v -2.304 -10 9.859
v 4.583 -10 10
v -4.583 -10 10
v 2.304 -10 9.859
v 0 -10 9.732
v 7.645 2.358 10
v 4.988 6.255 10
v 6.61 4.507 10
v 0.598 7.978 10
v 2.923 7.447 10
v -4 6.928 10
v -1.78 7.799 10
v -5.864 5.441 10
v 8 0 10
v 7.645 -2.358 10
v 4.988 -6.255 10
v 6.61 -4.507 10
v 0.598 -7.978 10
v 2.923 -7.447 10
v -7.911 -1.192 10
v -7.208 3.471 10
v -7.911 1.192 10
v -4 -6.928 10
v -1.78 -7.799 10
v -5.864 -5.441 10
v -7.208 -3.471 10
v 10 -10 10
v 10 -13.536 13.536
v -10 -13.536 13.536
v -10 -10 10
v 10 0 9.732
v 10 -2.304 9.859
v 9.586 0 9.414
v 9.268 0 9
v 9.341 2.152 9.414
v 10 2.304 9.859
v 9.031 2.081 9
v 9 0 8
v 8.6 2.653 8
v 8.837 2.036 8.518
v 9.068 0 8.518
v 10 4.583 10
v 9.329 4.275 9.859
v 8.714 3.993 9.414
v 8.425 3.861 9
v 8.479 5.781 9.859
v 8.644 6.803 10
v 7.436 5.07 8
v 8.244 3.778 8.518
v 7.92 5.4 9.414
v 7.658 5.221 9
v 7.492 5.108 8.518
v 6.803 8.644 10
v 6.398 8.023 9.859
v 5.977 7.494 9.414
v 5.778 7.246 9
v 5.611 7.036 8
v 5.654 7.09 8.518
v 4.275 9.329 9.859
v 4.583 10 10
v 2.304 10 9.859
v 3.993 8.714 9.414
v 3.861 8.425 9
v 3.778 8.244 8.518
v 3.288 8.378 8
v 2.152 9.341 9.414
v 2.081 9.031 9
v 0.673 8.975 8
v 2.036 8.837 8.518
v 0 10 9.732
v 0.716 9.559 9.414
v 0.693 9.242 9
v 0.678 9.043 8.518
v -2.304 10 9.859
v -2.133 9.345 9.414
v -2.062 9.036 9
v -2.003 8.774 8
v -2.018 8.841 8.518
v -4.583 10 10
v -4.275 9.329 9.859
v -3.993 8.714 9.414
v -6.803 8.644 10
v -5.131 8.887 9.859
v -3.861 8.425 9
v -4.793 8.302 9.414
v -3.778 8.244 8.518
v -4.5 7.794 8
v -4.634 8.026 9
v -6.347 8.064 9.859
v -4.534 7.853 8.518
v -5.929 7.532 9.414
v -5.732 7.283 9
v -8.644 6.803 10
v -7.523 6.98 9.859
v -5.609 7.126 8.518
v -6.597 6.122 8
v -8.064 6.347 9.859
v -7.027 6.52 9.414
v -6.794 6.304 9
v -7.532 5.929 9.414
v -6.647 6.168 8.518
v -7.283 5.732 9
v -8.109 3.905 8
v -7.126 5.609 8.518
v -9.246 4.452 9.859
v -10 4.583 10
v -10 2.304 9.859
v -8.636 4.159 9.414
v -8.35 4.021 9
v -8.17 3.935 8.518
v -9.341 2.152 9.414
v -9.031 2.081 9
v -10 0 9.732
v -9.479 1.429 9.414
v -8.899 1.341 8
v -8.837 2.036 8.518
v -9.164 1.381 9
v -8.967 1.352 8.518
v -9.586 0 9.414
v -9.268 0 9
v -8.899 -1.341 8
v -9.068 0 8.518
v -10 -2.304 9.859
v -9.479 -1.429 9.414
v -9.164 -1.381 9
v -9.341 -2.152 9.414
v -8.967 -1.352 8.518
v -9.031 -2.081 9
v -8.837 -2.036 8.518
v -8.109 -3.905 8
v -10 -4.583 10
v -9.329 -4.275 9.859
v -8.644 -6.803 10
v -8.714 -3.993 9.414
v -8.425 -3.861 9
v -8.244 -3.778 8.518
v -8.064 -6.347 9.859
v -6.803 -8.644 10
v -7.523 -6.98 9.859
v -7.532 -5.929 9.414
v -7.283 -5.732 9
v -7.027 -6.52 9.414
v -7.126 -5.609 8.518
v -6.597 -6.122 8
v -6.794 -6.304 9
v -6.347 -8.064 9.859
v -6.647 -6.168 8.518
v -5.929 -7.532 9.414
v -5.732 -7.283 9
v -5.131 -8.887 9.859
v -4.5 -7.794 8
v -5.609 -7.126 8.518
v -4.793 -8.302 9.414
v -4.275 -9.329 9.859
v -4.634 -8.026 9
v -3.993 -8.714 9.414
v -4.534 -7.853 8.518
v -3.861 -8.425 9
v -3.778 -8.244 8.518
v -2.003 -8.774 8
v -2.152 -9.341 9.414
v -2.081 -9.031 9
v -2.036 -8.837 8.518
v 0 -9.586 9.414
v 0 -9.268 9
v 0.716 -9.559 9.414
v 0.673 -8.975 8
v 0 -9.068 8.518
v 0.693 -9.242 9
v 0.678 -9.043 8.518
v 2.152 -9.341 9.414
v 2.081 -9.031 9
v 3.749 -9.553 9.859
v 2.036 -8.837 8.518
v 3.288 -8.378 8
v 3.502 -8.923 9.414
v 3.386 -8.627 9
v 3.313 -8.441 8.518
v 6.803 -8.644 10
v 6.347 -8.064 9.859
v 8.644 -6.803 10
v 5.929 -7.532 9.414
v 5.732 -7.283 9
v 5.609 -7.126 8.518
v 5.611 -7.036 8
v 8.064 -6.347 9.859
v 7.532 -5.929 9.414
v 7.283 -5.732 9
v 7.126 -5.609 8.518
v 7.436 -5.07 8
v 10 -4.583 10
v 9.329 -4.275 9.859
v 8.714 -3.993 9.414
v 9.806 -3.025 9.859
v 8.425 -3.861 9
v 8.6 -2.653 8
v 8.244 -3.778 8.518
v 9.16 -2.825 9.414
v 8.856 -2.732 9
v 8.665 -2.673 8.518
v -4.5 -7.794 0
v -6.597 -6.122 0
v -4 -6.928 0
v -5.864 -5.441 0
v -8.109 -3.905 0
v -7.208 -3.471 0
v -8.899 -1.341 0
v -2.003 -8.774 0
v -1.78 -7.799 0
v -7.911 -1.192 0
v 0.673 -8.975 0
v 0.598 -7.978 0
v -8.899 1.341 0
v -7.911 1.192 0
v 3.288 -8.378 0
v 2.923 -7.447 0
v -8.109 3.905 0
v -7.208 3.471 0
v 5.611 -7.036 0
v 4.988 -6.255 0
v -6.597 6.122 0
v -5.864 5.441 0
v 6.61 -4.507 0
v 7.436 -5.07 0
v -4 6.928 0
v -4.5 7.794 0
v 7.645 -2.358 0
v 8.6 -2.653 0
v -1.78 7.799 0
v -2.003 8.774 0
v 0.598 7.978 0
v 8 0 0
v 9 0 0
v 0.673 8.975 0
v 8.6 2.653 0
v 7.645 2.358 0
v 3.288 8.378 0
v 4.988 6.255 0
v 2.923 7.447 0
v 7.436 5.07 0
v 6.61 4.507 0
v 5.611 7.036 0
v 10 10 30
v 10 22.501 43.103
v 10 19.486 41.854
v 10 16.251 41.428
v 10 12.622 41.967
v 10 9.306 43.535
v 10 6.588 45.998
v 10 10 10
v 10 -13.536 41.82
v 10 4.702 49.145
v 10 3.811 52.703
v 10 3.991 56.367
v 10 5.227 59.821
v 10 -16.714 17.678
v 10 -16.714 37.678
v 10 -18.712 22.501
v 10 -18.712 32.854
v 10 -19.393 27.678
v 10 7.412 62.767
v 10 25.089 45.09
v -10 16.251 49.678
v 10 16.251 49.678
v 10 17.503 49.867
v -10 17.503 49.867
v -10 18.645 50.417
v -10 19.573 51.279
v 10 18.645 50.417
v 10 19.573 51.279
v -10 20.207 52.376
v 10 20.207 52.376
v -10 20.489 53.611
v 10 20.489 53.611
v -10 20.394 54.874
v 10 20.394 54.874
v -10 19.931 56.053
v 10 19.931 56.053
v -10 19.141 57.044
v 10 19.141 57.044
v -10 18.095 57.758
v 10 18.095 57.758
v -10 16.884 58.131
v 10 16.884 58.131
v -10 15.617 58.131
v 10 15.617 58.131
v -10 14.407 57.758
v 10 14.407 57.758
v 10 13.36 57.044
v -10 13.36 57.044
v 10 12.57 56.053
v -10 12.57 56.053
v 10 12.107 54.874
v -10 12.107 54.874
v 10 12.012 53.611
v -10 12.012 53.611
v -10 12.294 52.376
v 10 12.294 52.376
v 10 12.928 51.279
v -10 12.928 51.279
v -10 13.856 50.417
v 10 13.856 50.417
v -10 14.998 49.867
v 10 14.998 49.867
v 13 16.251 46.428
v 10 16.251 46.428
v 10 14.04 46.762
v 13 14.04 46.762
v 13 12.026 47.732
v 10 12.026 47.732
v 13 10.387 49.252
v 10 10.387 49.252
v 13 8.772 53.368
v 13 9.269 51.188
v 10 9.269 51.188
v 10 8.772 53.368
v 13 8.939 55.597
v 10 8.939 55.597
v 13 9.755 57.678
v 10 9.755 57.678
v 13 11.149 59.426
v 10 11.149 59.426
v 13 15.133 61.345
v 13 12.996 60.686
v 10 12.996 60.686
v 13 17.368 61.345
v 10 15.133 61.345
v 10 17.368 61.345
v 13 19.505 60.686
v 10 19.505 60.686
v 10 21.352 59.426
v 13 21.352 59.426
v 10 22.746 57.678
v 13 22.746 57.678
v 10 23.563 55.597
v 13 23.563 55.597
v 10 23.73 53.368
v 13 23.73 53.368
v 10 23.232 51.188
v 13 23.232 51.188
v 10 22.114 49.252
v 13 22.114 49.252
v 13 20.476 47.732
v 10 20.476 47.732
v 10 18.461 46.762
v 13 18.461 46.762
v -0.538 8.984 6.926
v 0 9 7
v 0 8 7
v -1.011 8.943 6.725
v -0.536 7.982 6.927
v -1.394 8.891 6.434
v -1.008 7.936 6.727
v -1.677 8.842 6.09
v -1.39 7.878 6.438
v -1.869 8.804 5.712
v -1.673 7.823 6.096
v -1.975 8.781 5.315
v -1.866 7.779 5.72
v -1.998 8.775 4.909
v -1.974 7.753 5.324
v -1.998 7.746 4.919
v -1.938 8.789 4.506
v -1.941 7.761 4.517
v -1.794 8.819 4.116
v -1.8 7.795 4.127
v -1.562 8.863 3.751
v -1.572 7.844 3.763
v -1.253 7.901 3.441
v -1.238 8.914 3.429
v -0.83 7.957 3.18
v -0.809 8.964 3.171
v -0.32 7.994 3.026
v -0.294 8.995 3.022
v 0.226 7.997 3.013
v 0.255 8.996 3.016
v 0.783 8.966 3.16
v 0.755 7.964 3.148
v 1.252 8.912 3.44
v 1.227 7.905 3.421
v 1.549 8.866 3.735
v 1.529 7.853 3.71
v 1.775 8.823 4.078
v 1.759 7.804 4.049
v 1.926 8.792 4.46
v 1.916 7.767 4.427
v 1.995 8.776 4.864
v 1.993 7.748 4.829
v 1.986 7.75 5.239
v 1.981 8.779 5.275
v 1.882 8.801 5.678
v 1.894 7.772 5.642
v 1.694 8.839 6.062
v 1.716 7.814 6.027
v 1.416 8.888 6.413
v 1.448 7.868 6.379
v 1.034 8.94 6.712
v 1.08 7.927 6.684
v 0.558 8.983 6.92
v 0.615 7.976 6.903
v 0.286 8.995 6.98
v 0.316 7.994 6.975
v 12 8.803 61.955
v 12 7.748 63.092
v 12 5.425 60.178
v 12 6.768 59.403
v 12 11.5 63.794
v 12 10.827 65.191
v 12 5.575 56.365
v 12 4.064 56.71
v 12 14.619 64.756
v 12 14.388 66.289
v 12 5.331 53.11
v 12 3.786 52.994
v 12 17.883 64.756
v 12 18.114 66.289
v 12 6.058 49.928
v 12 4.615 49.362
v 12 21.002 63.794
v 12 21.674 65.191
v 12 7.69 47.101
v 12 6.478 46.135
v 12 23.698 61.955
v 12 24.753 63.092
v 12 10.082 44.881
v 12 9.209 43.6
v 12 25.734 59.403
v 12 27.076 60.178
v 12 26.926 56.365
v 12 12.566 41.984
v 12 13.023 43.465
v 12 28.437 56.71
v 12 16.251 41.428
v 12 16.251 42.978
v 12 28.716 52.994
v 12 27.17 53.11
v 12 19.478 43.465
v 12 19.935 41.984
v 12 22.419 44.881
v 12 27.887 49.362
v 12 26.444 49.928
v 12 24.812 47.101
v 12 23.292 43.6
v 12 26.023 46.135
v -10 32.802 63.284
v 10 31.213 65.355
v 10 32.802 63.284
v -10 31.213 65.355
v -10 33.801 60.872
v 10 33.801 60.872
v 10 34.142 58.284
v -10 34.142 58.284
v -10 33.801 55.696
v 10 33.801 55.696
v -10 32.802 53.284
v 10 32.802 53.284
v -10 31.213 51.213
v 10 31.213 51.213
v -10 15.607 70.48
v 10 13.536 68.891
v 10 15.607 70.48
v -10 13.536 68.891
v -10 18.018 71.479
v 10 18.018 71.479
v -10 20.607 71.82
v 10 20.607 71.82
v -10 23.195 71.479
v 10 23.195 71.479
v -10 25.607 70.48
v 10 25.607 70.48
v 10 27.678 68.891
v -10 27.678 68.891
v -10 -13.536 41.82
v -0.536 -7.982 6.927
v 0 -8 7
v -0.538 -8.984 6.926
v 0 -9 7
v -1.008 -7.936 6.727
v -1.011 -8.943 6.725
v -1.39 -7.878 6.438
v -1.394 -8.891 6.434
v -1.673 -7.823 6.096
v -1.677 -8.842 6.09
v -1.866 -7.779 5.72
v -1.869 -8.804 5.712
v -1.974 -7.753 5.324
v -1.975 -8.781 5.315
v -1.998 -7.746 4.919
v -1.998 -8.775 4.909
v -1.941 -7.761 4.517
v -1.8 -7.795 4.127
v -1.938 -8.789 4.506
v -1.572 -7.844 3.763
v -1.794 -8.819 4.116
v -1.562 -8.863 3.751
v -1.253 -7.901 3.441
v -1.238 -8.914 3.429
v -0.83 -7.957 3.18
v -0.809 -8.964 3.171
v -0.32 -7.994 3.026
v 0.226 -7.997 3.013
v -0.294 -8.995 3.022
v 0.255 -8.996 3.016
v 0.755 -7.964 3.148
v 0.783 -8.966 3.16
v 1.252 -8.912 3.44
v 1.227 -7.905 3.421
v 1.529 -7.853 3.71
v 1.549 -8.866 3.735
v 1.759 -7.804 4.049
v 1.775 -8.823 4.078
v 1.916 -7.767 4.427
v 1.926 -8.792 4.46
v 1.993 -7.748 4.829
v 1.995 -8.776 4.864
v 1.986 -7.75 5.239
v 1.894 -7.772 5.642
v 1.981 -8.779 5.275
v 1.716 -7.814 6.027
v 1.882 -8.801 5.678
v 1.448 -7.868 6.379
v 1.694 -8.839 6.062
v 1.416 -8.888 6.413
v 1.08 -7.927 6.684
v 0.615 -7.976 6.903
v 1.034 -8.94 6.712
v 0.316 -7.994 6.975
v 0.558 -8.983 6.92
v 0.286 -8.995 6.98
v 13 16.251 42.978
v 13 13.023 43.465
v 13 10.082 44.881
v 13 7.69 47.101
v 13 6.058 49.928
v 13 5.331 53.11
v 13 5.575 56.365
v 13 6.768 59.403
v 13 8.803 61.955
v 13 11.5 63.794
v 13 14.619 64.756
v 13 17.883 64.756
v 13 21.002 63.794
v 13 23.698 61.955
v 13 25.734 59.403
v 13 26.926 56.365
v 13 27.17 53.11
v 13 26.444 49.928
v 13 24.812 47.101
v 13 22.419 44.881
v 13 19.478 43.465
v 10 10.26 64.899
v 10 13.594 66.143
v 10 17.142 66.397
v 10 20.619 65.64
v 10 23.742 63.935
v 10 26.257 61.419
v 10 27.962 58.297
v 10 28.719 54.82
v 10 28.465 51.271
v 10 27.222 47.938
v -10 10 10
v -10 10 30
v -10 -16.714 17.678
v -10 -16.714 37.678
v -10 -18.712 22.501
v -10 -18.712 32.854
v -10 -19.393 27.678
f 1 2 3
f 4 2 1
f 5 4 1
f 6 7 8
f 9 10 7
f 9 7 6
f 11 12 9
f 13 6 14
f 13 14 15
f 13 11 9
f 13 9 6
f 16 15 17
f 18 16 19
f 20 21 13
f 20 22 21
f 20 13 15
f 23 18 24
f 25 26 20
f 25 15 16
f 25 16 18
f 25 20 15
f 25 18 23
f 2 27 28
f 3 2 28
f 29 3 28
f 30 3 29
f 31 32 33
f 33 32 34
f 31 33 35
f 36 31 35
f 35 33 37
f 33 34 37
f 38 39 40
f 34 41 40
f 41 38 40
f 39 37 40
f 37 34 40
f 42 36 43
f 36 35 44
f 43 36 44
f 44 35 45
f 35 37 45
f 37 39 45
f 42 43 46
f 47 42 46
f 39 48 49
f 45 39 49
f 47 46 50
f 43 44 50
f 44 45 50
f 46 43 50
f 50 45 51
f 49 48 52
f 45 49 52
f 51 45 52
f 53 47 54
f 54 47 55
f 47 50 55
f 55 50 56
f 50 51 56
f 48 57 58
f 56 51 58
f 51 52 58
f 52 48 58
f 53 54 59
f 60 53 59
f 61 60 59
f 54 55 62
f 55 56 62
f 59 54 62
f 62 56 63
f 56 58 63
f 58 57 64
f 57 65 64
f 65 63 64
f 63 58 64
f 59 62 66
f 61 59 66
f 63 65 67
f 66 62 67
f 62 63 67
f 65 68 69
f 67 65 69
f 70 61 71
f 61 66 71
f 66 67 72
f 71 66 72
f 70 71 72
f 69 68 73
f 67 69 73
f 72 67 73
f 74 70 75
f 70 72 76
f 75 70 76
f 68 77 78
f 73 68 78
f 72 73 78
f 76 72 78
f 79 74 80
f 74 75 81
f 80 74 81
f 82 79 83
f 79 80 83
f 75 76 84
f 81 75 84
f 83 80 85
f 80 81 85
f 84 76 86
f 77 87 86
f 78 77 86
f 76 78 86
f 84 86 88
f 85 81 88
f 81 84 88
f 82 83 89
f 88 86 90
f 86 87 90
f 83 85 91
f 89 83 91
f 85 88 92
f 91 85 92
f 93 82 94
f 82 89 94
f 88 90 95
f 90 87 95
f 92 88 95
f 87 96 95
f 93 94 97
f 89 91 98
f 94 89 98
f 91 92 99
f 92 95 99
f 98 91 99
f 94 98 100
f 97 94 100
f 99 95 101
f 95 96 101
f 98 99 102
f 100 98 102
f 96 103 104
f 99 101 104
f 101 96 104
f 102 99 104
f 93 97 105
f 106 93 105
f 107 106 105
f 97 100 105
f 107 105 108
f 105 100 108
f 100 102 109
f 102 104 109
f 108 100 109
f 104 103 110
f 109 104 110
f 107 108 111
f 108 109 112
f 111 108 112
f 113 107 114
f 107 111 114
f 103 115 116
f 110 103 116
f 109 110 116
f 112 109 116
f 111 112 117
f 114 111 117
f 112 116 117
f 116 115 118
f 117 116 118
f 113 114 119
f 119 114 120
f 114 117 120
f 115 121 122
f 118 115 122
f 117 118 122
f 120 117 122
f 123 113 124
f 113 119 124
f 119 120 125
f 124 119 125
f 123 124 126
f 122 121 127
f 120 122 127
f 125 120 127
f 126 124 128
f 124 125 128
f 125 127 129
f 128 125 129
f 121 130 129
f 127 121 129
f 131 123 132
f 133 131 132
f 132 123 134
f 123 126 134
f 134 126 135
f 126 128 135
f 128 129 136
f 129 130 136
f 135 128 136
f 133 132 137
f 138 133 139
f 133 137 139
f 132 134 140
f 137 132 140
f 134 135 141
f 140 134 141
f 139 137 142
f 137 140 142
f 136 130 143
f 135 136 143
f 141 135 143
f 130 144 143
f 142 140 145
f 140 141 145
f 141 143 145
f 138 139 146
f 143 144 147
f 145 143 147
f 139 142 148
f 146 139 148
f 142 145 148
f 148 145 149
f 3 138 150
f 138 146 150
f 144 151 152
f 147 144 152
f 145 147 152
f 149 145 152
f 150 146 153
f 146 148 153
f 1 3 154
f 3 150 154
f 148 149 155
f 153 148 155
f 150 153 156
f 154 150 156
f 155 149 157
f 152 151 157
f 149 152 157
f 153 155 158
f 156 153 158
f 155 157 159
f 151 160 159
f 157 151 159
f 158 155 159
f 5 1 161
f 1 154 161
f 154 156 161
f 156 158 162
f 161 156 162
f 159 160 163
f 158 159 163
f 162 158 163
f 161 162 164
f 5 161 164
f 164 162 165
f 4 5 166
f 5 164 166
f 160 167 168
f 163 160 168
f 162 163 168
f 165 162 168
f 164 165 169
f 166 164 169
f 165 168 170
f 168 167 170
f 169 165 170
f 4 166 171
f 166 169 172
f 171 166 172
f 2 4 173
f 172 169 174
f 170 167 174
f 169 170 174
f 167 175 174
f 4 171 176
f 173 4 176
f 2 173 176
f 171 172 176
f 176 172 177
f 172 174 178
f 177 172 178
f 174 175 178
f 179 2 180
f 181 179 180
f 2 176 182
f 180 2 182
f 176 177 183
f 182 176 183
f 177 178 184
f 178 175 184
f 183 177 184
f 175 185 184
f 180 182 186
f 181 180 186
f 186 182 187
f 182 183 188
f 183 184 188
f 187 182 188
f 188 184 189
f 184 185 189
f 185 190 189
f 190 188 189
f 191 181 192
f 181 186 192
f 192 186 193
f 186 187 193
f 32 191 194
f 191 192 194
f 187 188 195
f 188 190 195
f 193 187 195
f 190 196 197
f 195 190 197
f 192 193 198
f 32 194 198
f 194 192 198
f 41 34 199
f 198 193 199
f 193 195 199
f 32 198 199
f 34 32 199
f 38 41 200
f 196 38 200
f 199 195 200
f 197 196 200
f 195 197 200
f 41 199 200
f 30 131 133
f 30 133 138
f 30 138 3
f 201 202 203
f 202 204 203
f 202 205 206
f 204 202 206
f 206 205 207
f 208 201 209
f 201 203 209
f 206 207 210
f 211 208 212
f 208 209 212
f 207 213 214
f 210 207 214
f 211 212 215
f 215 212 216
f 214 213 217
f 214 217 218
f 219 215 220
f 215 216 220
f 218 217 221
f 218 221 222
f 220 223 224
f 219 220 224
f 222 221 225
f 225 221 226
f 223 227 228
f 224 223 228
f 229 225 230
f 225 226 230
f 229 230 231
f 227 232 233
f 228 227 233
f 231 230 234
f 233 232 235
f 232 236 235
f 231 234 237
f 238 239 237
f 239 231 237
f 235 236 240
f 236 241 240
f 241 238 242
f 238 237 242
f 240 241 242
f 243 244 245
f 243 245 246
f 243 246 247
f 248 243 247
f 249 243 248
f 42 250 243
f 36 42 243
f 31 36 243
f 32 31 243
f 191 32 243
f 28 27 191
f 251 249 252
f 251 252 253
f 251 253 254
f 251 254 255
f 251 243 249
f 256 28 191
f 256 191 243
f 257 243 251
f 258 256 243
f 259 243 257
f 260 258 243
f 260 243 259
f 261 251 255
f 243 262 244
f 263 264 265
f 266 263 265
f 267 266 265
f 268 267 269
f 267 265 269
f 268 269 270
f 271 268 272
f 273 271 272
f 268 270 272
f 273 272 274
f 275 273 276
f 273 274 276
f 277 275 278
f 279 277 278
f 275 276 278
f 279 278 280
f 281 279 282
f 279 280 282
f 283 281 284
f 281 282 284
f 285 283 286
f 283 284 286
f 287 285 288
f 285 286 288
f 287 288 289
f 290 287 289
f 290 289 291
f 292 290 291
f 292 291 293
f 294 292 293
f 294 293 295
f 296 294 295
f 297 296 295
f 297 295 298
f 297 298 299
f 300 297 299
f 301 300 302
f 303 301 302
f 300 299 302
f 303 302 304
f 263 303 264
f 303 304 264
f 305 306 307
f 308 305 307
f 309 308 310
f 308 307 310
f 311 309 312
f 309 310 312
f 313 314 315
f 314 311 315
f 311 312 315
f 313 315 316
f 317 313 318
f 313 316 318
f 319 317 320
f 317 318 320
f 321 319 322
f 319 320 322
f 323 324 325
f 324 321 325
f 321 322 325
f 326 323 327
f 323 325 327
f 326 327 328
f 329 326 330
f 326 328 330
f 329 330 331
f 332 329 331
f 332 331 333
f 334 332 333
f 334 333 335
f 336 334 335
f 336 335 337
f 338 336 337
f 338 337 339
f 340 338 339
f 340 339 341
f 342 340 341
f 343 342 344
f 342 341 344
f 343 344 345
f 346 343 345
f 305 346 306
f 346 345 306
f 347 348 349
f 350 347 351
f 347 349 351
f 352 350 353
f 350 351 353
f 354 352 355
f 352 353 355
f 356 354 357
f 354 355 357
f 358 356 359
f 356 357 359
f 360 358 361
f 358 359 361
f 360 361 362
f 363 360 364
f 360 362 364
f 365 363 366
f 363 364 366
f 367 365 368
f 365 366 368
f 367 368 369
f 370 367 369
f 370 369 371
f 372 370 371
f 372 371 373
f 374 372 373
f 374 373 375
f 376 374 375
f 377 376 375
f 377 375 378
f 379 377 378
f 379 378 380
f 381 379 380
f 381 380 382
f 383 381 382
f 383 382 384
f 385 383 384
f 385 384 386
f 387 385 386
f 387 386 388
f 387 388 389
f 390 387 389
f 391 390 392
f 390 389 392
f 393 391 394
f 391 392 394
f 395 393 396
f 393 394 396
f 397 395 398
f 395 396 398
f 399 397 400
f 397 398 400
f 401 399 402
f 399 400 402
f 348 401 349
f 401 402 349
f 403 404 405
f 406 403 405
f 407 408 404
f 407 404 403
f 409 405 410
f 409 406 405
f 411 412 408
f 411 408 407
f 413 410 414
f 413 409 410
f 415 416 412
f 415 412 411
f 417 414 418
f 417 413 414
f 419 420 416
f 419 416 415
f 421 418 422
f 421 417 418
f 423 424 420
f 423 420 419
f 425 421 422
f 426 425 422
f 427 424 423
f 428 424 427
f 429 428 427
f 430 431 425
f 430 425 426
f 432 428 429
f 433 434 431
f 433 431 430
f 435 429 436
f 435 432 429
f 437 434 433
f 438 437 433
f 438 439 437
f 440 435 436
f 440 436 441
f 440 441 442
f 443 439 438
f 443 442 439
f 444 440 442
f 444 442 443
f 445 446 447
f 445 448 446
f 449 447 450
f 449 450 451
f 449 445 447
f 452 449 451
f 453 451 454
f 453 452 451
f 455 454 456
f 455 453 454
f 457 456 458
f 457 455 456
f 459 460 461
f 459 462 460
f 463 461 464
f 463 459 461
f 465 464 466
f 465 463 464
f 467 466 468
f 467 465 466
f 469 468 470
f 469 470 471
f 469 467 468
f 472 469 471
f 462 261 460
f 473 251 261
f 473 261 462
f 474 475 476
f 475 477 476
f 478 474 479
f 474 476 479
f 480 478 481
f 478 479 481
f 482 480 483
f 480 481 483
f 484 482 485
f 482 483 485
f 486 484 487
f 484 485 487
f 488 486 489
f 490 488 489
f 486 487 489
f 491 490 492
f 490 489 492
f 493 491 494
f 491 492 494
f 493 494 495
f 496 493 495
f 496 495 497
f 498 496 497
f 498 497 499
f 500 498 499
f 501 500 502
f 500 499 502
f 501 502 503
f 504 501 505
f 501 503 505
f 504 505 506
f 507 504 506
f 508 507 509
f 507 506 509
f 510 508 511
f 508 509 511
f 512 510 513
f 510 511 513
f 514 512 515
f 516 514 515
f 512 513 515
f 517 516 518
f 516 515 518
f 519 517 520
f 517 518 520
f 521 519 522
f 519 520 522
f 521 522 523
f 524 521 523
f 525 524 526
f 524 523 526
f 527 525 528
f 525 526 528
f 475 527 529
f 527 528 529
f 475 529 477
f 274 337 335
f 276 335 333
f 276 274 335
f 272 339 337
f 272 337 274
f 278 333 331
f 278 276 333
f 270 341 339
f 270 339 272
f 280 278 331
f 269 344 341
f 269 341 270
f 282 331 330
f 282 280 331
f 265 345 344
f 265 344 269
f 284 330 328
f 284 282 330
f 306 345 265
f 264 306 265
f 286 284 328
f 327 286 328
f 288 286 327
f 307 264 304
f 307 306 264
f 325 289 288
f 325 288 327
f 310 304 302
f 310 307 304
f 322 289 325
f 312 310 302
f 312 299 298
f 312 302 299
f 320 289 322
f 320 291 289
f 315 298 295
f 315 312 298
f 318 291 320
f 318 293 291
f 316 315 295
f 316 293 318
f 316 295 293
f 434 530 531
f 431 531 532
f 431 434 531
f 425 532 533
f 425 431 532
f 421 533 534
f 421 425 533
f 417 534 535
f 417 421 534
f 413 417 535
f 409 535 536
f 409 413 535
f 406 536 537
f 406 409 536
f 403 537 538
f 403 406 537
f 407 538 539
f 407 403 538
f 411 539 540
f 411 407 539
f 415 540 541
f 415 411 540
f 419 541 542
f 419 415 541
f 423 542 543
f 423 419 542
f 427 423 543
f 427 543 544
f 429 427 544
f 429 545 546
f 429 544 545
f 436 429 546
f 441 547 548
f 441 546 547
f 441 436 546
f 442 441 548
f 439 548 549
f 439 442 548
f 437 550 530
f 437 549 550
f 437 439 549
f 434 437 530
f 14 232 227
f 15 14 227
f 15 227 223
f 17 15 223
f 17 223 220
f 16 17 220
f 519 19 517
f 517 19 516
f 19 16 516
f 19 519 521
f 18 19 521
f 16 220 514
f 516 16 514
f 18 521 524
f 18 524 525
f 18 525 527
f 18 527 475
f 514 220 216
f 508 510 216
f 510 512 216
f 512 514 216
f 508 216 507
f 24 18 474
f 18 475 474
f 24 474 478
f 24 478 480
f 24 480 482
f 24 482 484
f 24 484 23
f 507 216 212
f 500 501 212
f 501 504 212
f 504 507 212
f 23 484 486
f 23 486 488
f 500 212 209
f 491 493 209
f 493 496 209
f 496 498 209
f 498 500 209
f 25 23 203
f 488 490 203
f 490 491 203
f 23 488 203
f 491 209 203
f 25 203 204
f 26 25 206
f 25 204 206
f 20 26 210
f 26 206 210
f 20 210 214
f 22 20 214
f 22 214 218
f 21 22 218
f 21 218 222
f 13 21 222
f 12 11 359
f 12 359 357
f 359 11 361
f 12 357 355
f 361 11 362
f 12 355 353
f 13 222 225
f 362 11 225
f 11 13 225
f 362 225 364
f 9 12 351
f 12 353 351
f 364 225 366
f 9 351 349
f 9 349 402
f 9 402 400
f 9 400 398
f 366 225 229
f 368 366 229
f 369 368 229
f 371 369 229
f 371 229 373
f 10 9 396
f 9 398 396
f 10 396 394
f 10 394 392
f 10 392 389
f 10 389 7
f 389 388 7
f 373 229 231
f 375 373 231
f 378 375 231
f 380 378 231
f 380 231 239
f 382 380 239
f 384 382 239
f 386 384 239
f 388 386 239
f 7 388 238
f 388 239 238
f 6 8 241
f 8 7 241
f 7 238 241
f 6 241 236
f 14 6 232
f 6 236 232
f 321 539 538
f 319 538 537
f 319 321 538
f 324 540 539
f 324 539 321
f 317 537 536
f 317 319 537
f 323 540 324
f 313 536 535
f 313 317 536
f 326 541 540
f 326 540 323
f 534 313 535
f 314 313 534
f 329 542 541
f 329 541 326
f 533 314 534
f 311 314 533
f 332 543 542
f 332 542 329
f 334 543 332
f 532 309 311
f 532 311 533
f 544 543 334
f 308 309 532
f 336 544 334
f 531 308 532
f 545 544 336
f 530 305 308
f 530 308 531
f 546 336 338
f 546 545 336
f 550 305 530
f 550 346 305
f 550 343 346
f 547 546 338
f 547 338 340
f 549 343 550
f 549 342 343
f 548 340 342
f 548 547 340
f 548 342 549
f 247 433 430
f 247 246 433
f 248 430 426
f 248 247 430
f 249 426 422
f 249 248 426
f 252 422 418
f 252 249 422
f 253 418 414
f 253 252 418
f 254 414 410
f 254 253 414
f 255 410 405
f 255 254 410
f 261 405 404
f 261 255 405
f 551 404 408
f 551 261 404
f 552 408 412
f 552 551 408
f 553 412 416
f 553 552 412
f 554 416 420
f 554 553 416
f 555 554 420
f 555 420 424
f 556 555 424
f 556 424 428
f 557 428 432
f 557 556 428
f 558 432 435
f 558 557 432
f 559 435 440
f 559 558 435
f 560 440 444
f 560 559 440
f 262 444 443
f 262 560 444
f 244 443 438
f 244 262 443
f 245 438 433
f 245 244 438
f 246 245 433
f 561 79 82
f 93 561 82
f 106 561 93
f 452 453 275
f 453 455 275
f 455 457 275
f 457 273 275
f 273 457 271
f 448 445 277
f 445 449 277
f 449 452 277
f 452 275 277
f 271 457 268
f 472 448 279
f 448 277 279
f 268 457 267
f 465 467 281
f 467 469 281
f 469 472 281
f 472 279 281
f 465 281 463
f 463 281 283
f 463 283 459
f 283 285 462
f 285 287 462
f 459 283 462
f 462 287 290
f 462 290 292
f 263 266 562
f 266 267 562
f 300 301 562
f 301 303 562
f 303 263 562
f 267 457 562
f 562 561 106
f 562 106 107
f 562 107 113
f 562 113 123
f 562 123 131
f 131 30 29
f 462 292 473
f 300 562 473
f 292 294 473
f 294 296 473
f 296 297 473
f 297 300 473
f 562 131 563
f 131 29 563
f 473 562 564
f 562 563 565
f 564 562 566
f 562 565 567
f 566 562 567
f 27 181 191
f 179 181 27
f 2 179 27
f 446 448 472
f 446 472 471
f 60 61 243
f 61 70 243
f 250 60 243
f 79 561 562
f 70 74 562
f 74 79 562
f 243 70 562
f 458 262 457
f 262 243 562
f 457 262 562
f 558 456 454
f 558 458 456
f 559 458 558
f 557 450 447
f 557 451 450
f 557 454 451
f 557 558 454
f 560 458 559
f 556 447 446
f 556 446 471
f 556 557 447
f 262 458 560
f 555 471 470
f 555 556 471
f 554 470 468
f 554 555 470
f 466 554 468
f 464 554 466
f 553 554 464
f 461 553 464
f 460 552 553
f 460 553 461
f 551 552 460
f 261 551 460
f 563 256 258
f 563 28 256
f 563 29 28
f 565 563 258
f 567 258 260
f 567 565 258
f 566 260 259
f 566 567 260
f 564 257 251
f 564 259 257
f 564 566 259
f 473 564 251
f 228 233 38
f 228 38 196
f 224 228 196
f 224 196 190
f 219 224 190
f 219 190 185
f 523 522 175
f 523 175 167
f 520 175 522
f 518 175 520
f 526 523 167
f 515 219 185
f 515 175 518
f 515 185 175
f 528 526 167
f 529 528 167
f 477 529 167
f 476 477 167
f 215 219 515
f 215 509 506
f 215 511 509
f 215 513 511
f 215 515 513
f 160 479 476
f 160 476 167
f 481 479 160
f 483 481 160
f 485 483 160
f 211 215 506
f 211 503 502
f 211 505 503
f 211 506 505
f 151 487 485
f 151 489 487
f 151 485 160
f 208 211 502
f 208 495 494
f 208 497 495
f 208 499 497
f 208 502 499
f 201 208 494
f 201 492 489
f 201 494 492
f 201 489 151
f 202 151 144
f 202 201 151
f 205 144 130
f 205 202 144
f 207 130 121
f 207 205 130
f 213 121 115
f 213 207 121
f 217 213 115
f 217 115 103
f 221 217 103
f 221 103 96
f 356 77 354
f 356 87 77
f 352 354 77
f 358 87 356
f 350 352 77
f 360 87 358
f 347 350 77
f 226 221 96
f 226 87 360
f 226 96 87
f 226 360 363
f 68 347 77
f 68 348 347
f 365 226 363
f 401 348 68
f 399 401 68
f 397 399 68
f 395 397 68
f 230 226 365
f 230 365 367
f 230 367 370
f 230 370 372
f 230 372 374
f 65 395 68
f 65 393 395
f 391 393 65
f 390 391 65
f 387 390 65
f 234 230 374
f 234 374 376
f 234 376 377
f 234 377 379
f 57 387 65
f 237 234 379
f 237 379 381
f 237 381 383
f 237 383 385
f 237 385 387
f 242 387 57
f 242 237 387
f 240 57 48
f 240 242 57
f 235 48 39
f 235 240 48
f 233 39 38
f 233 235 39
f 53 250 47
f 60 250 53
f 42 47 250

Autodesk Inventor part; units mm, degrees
ref_plane "YZ Plane" through (0, 0, 0) normal (1, 0, 0) x (0, 1, 0)
sketch "Esquisse1" plane through (0, 0, 0) normal (0, 0, 1) x (1, 0, 0)
  circle A0 centre (0, 0) radius 8
  circle A1 centre (0, 0) radius 9
  dimension "d0" = 16
  dimension "d1" = 18
extrude "Extrusion1" add sketch "Esquisse1" along normal blind 10
sketch "Esquisse2" plane through (0, 0, 0) normal (1, 0, 0) x (0, 1, 0)
  line L0 (9, 10) -> (-9, 10) projected
  line L1 (0, 10) -> (0, 25)
  line L2 (9, 10) -> (-9, 10)
  line L3 (0, 10) -> (10, 10)
  line L4 (10, 10) -> (10, 30)
  line L5 (10, 30) -> (-10, 30)
  line L6 (-10, 30) -> (-10, 10)
  line L7 (-10, 10) -> (0, 10)
  point P0 (0, 0)
  dimension "d26" = 10
  dimension "d27" = 20
  dimension "d28" = 20
  dimension "d29" = 90
extrude "Extrusion2" add sketch "Esquisse2" along normal mid plane 20
fillet "Congé1" radius 2 1 edges at (-9, 0, 10)
sketch "Esquisse4" plane through (0, 0, 0) normal (0, 1, 0) x (-1, 0, 0)
  line L0 (9, 0) -> (-9, 0) projected
  line L1 (9, 0) -> (0, 0)
  line L2 (0, 0) -> (0, 5)
  line L3 (0, 0) -> (5, 0) construction
  dimension "d14" = 9
  dimension "d15" = 5
  dimension "d16" = 90
hole "Perçage1" at (0, 0, 5) direction (0, -1, 0) diameter 4 end through all both
ref_plane "Plan de construction2" through (0, -8.75, 15.1554) normal (0, -0.5, 0.8660254) x (1, 0, 0)
ref_plane "Plan de construction1" through (0, 0, 0) normal (0, -0.5, 0.8660254) x (1, 0, 0)
ref_plane "Plan de construction4" through (0, -10, 10) normal (0, -0.7071068, 0.7071068) x (1, 0, 0)
ref_plane "Plan de construction3" through (0, 0, 0) normal (0, -0.7071068, 0.7071068) x (1, 0, 0)
sketch "Esquisse6" plane through (0, -10, 10) normal (0, -0.7071068, 0.7071068) x (1, 0, 0)
  line L0 (-10, 28.2843) -> (-10, 14.1421) projected
  line L1 (10, 14.1421) -> (10, 0) projected
  line L2 (-10, 28.2843) -> (10, 28.2843)
  line L3 (10, 28.2843) -> (10, 0)
  line L4 (10, 0) -> (-10, 0)
  line L5 (-10, 0) -> (-10, 28.2843)
  line L6 (-10, 28.2843) -> (10, 28.2843) projected
  line L7 (10, 14.1421) -> (10, 28.2843) projected
  line L8 (4.5826, 14.1421) -> (10, 14.1421) projected
  line L9 (-10, 14.1421) -> (-4.5826, 14.1421) projected
  line L10 (-10, 28.2843) -> (-10, 14.1421) projected
  point P0 (0, 0)
extrude "Extrusion4" add sketch "Esquisse6" along normal blind 25
sketch "Esquisse8" plane through (-10, 10, 30) normal (0, 0.7071068, 0.7071068) x (1, 0, 0)
  line L0 (20, 0) -> (0, 0) projected
  line L1 (0, 0) -> (0, -25) projected
  line L2 (20, -25) -> (0, -25) projected
  line L3 (20, 0) -> (20, -25) projected
  point P0 (10, 14.1422)
extrude "Extrusion5" add sketch "Esquisse8" along normal blind 40
fillet "Congé4" radius 20 1 edges at (0, -27.6777, 27.6777)
fillet "Congé5" radius 10 2 edges at (0, 38.2842, 58.2843) (0, 20.6066, 75.962)
sketch "Esquisse9" plane through (10, 0, 0) normal (1, 0, 0) x (0, 0, -1)
  line L0 (-41.8199, -13.5356) -> (-68.8909, 13.5355) projected
  line L1 (-30, 9.9999) -> (-51.2132, 31.2132) projected
  line L2 (-68.8909, 27.6776) -> (-65.3554, 31.2132) projected
  arc A0 (-68.8909, 27.6776) -> (-68.8909, 13.5355) centre (-61.8199, 20.6066) ccw projected
  circle A1 centre (-53.9284, 16.2506) radius 4.25
  point P0 (0, 0)
  point P1 (-67.1232, 29.4454)
  point P2 (-71.8199, 20.6066)
  dimension "d48" = 8.5
extrude "Extrusion6" cut sketch "Esquisse9" against normal through all
sketch "Esquisse10" plane through (10, 0, 0) normal (1, 0, 0) x (0, 0, -1)
  circle A0 centre (-53.9284, 16.2506) radius 4.25 projected
  circle A1 centre (-53.9284, 16.2506) radius 7.5
  circle A2 centre (-53.9284, 16.2506) radius 10.95
  point P0 (0, 0)
  dimension "d49" = 15
  dimension "d50" = 21.9
extrude "Extrusion7" add sketch "Esquisse10" along normal blind 3 contours A2
sketch "Esquisse11" plane through (10, 0, 0) normal (1, 0, 0) x (0, 0, -1)
  circle A0 centre (-53.9284, 16.2506) radius 10.95 projected
  circle A1 centre (-53.9284, 16.2506) radius 7.5 projected
  circle A2 centre (-53.9284, 16.2506) radius 4.25 projected
  circle A3 centre (-53.9284, 16.2506) radius 12.5
  line L0 (-30, 9.9999) -> (-51.2132, 31.2132) projected
  point P0 (0, 0)
extrude "Extrusion8" add sketch "Esquisse11" along normal blind 2 contours A0 | A3
properties part number "bielle roue milieu"
